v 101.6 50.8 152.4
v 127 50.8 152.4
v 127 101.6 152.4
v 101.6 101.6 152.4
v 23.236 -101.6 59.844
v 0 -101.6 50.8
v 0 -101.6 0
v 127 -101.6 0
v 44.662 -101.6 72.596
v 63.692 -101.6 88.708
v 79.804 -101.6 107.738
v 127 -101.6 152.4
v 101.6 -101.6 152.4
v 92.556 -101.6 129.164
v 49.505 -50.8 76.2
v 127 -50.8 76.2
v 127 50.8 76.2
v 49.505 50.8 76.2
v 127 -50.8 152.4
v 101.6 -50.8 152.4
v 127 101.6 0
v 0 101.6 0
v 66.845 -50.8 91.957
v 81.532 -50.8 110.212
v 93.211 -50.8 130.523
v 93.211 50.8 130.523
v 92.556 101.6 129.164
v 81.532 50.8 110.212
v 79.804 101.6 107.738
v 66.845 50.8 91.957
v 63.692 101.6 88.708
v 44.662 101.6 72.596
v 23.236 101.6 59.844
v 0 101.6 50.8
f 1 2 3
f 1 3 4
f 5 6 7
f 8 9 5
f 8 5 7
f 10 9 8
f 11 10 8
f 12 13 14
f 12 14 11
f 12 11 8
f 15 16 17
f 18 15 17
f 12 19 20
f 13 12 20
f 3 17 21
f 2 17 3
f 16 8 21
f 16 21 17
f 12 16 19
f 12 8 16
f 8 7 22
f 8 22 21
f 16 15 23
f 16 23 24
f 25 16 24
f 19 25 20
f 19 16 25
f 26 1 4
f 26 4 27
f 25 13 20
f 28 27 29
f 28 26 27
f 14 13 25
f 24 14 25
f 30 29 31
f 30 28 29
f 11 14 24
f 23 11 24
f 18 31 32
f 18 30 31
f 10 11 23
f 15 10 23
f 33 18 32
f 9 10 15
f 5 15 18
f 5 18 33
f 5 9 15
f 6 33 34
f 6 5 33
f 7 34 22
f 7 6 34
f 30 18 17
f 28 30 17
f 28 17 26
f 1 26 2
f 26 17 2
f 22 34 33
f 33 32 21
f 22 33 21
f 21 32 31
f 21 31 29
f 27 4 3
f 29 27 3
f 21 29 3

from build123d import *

# Parameters (mm, degrees)
F1_DEPTH = 101.6
F2_W     = 101.6
F2_H     = 76.2
F3_DEPTH = 127.001


with BuildPart() as f1:
    # F0 (on Front) → F1 (new body, symmetric)
    with BuildSketch(Plane.XZ):
        with BuildLine():
            Line((0, 50.8), (0, 0))
            Line((0, 0), (127, 0))
            Line((127, 0), (127, 152.4))
            Line((127, 152.4), (101.6, 152.4))
            ThreePointArc((101.6, 152.4), (63.692052, 88.707948), (0, 50.8))
        make_face()
    extrude(amount=F1_DEPTH, both=True)

    # F2 (on face) → F3 (cut, through all)
    with BuildSketch(Plane.YZ.offset(127)):
        with Locations((0, 114.3)):
            Rectangle(F2_W, F2_H)
    extrude(amount=-F3_DEPTH, mode=Mode.SUBTRACT)


solid = f1.part
